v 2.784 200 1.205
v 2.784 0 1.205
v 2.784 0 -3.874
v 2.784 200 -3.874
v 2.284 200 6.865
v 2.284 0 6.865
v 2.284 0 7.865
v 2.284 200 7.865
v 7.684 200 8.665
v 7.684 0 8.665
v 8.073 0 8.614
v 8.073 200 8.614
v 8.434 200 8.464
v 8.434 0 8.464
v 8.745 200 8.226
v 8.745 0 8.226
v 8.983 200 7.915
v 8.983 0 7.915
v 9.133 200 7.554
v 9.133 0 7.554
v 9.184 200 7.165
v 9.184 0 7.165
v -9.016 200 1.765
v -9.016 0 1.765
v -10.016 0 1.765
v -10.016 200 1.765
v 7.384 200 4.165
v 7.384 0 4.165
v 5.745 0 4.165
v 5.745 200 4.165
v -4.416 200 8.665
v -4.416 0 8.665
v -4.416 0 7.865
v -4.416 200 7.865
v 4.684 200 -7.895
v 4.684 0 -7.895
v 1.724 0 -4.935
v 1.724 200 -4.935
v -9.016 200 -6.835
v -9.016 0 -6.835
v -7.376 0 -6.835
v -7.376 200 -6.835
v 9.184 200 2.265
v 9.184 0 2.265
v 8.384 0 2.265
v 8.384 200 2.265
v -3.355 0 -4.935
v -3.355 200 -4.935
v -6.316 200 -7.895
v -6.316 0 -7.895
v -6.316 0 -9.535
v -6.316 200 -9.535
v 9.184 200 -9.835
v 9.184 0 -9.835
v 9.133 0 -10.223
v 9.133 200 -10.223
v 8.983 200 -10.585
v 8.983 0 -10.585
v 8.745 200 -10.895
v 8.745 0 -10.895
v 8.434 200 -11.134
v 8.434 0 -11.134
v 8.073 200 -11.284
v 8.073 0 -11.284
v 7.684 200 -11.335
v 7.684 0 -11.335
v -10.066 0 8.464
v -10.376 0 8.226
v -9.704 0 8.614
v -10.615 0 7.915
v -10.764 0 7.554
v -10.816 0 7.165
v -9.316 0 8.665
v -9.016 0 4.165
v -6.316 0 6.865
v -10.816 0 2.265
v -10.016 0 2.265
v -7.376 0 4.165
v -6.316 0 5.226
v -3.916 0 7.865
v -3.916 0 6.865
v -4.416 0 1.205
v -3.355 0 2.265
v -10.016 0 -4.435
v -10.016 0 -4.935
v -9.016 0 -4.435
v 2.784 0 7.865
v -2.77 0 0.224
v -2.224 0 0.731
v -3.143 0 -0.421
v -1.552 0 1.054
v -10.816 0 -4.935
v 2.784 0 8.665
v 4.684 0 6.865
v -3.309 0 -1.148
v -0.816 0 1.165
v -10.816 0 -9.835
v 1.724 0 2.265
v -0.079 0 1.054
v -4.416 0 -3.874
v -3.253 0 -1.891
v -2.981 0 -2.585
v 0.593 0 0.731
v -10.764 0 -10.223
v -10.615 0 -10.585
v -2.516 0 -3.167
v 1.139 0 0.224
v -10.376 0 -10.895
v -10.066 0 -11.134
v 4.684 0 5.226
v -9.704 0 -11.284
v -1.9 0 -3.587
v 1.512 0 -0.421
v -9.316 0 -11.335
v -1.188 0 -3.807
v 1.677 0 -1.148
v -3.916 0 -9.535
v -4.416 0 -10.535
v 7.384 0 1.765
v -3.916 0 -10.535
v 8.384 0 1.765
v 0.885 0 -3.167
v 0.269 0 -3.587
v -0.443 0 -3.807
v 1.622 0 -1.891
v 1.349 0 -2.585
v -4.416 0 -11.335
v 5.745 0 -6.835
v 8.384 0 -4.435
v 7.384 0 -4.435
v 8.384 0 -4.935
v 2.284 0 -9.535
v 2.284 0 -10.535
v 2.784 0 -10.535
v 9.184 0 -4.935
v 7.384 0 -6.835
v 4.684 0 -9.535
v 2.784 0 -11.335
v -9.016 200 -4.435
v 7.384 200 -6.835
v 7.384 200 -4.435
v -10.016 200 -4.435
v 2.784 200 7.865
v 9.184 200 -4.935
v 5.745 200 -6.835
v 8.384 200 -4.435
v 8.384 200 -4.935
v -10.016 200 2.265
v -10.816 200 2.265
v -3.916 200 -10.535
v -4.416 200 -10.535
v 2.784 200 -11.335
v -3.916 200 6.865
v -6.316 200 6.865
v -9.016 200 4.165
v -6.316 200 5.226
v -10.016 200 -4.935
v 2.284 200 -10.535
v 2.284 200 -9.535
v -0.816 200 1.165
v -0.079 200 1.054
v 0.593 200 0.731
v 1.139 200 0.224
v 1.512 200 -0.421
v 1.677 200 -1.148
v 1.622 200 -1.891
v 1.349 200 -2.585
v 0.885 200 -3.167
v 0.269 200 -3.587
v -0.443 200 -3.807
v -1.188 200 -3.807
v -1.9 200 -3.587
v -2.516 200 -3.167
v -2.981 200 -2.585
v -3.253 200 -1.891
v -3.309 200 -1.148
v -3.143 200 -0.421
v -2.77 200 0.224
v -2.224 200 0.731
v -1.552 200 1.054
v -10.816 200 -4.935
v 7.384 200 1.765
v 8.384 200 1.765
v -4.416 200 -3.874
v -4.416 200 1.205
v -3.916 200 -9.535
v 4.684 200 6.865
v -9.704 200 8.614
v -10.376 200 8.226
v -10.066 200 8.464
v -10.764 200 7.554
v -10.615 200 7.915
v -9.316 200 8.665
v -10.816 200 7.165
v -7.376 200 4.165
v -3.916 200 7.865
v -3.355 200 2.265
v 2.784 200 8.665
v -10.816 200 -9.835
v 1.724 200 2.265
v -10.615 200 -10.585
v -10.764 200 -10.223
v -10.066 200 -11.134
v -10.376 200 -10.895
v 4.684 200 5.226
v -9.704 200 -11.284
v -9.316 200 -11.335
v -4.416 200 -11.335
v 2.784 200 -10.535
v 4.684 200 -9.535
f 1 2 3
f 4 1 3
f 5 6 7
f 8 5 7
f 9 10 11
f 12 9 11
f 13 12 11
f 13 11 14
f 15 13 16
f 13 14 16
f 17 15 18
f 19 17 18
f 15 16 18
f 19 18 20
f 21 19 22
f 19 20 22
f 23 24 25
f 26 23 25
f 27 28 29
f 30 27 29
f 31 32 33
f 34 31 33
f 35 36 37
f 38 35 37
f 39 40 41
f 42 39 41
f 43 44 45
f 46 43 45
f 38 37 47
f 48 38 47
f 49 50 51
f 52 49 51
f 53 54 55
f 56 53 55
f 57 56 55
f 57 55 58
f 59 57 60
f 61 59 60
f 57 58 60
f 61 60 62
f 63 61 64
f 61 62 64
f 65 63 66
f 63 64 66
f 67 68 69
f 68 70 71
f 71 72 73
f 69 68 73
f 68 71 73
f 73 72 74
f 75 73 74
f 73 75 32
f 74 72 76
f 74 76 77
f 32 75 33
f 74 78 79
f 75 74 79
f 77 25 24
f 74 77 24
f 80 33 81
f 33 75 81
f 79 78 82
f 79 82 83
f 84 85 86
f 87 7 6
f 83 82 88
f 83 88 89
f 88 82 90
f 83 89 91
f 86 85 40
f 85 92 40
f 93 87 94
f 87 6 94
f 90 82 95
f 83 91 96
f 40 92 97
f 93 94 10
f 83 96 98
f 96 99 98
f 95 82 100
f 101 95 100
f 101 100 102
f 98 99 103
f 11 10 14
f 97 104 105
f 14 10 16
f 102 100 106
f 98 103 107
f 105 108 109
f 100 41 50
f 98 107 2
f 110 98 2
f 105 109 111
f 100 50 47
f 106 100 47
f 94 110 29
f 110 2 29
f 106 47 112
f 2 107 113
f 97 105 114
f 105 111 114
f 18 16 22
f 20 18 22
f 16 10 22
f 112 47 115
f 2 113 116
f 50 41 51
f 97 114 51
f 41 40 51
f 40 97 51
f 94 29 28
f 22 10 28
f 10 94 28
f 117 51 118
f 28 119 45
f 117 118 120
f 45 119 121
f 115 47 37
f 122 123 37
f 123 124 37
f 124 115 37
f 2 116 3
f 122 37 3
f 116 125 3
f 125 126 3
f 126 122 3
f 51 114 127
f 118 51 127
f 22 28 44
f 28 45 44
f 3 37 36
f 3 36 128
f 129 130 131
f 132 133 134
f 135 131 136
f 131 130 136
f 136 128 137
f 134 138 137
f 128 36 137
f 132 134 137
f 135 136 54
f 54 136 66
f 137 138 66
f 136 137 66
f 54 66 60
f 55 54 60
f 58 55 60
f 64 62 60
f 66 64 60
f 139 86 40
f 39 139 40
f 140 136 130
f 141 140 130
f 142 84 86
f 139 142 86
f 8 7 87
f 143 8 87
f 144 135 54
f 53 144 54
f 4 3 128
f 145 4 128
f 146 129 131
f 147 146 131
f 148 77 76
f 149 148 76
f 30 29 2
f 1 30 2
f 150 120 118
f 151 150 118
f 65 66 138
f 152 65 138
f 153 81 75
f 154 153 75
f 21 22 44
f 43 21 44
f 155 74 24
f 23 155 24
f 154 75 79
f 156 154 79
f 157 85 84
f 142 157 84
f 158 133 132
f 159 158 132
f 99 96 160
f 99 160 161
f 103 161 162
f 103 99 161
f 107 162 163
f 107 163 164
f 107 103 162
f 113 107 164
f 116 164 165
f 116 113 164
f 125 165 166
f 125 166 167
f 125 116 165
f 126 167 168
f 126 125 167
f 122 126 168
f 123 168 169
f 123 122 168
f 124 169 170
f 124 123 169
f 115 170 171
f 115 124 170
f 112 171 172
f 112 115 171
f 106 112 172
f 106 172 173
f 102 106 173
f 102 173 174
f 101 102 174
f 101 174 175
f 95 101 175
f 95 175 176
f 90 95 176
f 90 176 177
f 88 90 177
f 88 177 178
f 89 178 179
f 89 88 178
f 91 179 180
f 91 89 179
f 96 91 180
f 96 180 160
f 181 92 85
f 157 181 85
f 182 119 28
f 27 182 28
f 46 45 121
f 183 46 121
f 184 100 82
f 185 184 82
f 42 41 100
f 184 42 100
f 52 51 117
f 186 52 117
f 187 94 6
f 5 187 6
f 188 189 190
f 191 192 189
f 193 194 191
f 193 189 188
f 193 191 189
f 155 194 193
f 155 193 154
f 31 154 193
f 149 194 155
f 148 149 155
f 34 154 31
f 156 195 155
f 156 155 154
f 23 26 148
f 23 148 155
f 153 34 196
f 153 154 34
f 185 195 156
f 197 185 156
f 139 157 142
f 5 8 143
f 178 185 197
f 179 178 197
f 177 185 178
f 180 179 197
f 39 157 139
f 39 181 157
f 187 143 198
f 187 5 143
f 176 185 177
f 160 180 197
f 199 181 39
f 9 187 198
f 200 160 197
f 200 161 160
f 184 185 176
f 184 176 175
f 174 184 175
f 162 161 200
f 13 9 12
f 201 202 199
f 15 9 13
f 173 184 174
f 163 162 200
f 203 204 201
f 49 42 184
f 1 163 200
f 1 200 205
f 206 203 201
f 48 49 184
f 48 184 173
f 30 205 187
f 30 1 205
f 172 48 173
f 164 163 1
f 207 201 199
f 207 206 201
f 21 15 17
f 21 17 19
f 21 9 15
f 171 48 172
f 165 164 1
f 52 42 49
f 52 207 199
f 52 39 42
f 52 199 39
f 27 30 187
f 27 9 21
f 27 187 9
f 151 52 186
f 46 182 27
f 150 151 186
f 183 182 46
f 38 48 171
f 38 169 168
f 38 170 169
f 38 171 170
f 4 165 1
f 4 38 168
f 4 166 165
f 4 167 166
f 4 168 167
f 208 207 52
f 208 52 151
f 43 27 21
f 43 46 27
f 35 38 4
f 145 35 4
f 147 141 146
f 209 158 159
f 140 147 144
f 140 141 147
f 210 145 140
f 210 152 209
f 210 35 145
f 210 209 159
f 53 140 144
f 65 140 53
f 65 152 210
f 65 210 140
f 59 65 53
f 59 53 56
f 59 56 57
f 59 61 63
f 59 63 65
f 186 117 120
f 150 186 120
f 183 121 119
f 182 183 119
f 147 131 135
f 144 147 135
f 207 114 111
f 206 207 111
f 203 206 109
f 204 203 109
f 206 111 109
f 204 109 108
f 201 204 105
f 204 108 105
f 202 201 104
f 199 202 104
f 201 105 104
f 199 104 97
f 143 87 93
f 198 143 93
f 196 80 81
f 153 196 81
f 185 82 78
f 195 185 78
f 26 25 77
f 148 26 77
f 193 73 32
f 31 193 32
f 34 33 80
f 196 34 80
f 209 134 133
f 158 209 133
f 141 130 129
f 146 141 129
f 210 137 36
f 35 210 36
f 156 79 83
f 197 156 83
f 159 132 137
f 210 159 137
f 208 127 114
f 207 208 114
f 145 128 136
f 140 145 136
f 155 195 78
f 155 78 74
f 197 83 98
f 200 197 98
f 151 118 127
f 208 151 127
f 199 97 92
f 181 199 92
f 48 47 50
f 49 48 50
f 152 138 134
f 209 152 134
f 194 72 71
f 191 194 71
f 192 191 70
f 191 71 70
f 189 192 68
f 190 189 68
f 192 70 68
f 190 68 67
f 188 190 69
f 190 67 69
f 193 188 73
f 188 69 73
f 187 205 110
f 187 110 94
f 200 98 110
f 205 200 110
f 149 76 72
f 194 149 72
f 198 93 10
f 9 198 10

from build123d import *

# Parameters (mm, degrees)
SKETCH_1_R      = 2.5
EXTRUDE_1_DEPTH = 200


with BuildPart() as part:
    # 草图1 → 凸台-拉伸1 (new body)
    with BuildSketch(Plane(origin=(0, 0, 0), x_dir=(1, 0, 0), z_dir=(0, 1, 0))):
        with BuildLine():
            Line((-4.415608984, 3.873972711), (-4.415608984, -1.204706946))
            Line((-4.415608984, -1.204706946), (-7.376269156, -4.165367117))
            Line((-7.376269156, -4.165367117), (-9.015608984, -4.165367117))
            Line((-9.015608984, -4.165367117), (-9.015608984, -1.765367117))
            Line((-9.015608984, -1.765367117), (-10.015608984, -1.765367117))
            Line((-10.015608984, -1.765367117), (-10.015608984, -2.265367117))
            Line((-10.015608984, -2.265367117), (-10.815608984, -2.265367117))
            Line((-10.815608984, -2.265367117), (-10.815608984, -7.165367117))
            ThreePointArc((-10.815608984, -7.165367117), (-10.376269156, -8.226027289), (-9.315608984, -8.665367117))
            Line((-9.315608984, -8.665367117), (-4.415608984, -8.665367117))
            Line((-4.415608984, -8.665367117), (-4.415608984, -7.865367117))
            Line((-4.415608984, -7.865367117), (-3.915608984, -7.865367117))
            Line((-3.915608984, -7.865367117), (-3.915608984, -6.865367117))
            Line((-3.915608984, -6.865367117), (-6.315608984, -6.865367117))
            Line((-6.315608984, -6.865367117), (-6.315608984, -5.226027289))
            Line((-6.315608984, -5.226027289), (-3.354948812, -2.265367117))
            Line((-3.354948812, -2.265367117), (1.723730844, -2.265367117))
            Line((1.723730844, -2.265367117), (4.684391016, -5.226027289))
            Line((4.684391016, -5.226027289), (4.684391016, -6.865367117))
            Line((4.684391016, -6.865367117), (2.284391016, -6.865367117))
            Line((2.284391016, -6.865367117), (2.284391016, -7.865367117))
            Line((2.284391016, -7.865367117), (2.784391016, -7.865367117))
            Line((2.784391016, -7.865367117), (2.784391016, -8.665367117))
            Line((2.784391016, -8.665367117), (7.684391016, -8.665367117))
            ThreePointArc((7.684391016, -8.665367117), (8.745051188, -8.226027289), (9.184391016, -7.165367117))
            Line((9.184391016, -7.165367117), (9.184391016, -2.265367117))
            Line((9.184391016, -2.265367117), (8.384391016, -2.265367117))
            Line((8.384391016, -2.265367117), (8.384391016, -1.765367117))
            Line((8.384391016, -1.765367117), (7.384391016, -1.765367117))
            Line((7.384391016, -1.765367117), (7.384391016, -4.165367117))
            Line((7.384391016, -4.165367117), (5.745051188, -4.165367117))
            Line((5.745051188, -4.165367117), (2.784391016, -1.204706946))
            Line((2.784391016, -1.204706946), (2.784391016, 3.873972711))
            Line((2.784391016, 3.873972711), (5.745051188, 6.834632883))
            Line((5.745051188, 6.834632883), (7.384391016, 6.834632883))
            Line((7.384391016, 6.834632883), (7.384391016, 4.434632883))
            Line((7.384391016, 4.434632883), (8.384391016, 4.434632883))
            Line((8.384391016, 4.434632883), (8.384391016, 4.934632883))
            Line((8.384391016, 4.934632883), (9.184391016, 4.934632883))
            Line((9.184391016, 4.934632883), (9.184391016, 9.834632883))
            ThreePointArc((9.184391016, 9.834632883), (8.745051188, 10.895293054), (7.684391016, 11.334632883))
            Line((7.684391016, 11.334632883), (2.784391016, 11.334632883))
            Line((2.784391016, 11.334632883), (2.784391016, 10.534632883))
            Line((2.784391016, 10.534632883), (2.284391016, 10.534632883))
            Line((2.284391016, 10.534632883), (2.284391016, 9.534632883))
            Line((2.284391016, 9.534632883), (4.684391016, 9.534632883))
            Line((4.684391016, 9.534632883), (4.684391016, 7.895293054))
            Line((4.684391016, 7.895293054), (1.723730844, 4.934632883))
            Line((1.723730844, 4.934632883), (-3.354948812, 4.934632883))
            Line((-3.354948812, 4.934632883), (-6.315608984, 7.895293054))
            Line((-6.315608984, 7.895293054), (-6.315608984, 9.534632883))
            Line((-6.315608984, 9.534632883), (-3.915608984, 9.534632883))
            Line((-3.915608984, 9.534632883), (-3.915608984, 10.534632883))
            Line((-3.915608984, 10.534632883), (-4.415608984, 10.534632883))
            Line((-4.415608984, 10.534632883), (-4.415608984, 11.334632883))
            Line((-4.415608984, 11.334632883), (-9.315608984, 11.334632883))
            ThreePointArc((-9.315608984, 11.334632883), (-10.376269156, 10.895293054), (-10.815608984, 9.834632883))
            Line((-10.815608984, 9.834632883), (-10.815608984, 4.934632883))
            Line((-10.815608984, 4.934632883), (-10.015608984, 4.934632883))
            Line((-10.015608984, 4.934632883), (-10.015608984, 4.434632883))
            Line((-10.015608984, 4.434632883), (-9.015608984, 4.434632883))
            Line((-9.015608984, 4.434632883), (-9.015608984, 6.834632883))
            Line((-9.015608984, 6.834632883), (-7.376269156, 6.834632883))
            Line((-7.376269156, 6.834632883), (-4.415608984, 3.873972711))
        make_face()
        with Locations(Location((-0.815608984, 1.334632883, 0), (0, 0, 270))):
            Circle(SKETCH_1_R, mode=Mode.SUBTRACT)
    extrude(amount=EXTRUDE_1_DEPTH)


solid = part.part
